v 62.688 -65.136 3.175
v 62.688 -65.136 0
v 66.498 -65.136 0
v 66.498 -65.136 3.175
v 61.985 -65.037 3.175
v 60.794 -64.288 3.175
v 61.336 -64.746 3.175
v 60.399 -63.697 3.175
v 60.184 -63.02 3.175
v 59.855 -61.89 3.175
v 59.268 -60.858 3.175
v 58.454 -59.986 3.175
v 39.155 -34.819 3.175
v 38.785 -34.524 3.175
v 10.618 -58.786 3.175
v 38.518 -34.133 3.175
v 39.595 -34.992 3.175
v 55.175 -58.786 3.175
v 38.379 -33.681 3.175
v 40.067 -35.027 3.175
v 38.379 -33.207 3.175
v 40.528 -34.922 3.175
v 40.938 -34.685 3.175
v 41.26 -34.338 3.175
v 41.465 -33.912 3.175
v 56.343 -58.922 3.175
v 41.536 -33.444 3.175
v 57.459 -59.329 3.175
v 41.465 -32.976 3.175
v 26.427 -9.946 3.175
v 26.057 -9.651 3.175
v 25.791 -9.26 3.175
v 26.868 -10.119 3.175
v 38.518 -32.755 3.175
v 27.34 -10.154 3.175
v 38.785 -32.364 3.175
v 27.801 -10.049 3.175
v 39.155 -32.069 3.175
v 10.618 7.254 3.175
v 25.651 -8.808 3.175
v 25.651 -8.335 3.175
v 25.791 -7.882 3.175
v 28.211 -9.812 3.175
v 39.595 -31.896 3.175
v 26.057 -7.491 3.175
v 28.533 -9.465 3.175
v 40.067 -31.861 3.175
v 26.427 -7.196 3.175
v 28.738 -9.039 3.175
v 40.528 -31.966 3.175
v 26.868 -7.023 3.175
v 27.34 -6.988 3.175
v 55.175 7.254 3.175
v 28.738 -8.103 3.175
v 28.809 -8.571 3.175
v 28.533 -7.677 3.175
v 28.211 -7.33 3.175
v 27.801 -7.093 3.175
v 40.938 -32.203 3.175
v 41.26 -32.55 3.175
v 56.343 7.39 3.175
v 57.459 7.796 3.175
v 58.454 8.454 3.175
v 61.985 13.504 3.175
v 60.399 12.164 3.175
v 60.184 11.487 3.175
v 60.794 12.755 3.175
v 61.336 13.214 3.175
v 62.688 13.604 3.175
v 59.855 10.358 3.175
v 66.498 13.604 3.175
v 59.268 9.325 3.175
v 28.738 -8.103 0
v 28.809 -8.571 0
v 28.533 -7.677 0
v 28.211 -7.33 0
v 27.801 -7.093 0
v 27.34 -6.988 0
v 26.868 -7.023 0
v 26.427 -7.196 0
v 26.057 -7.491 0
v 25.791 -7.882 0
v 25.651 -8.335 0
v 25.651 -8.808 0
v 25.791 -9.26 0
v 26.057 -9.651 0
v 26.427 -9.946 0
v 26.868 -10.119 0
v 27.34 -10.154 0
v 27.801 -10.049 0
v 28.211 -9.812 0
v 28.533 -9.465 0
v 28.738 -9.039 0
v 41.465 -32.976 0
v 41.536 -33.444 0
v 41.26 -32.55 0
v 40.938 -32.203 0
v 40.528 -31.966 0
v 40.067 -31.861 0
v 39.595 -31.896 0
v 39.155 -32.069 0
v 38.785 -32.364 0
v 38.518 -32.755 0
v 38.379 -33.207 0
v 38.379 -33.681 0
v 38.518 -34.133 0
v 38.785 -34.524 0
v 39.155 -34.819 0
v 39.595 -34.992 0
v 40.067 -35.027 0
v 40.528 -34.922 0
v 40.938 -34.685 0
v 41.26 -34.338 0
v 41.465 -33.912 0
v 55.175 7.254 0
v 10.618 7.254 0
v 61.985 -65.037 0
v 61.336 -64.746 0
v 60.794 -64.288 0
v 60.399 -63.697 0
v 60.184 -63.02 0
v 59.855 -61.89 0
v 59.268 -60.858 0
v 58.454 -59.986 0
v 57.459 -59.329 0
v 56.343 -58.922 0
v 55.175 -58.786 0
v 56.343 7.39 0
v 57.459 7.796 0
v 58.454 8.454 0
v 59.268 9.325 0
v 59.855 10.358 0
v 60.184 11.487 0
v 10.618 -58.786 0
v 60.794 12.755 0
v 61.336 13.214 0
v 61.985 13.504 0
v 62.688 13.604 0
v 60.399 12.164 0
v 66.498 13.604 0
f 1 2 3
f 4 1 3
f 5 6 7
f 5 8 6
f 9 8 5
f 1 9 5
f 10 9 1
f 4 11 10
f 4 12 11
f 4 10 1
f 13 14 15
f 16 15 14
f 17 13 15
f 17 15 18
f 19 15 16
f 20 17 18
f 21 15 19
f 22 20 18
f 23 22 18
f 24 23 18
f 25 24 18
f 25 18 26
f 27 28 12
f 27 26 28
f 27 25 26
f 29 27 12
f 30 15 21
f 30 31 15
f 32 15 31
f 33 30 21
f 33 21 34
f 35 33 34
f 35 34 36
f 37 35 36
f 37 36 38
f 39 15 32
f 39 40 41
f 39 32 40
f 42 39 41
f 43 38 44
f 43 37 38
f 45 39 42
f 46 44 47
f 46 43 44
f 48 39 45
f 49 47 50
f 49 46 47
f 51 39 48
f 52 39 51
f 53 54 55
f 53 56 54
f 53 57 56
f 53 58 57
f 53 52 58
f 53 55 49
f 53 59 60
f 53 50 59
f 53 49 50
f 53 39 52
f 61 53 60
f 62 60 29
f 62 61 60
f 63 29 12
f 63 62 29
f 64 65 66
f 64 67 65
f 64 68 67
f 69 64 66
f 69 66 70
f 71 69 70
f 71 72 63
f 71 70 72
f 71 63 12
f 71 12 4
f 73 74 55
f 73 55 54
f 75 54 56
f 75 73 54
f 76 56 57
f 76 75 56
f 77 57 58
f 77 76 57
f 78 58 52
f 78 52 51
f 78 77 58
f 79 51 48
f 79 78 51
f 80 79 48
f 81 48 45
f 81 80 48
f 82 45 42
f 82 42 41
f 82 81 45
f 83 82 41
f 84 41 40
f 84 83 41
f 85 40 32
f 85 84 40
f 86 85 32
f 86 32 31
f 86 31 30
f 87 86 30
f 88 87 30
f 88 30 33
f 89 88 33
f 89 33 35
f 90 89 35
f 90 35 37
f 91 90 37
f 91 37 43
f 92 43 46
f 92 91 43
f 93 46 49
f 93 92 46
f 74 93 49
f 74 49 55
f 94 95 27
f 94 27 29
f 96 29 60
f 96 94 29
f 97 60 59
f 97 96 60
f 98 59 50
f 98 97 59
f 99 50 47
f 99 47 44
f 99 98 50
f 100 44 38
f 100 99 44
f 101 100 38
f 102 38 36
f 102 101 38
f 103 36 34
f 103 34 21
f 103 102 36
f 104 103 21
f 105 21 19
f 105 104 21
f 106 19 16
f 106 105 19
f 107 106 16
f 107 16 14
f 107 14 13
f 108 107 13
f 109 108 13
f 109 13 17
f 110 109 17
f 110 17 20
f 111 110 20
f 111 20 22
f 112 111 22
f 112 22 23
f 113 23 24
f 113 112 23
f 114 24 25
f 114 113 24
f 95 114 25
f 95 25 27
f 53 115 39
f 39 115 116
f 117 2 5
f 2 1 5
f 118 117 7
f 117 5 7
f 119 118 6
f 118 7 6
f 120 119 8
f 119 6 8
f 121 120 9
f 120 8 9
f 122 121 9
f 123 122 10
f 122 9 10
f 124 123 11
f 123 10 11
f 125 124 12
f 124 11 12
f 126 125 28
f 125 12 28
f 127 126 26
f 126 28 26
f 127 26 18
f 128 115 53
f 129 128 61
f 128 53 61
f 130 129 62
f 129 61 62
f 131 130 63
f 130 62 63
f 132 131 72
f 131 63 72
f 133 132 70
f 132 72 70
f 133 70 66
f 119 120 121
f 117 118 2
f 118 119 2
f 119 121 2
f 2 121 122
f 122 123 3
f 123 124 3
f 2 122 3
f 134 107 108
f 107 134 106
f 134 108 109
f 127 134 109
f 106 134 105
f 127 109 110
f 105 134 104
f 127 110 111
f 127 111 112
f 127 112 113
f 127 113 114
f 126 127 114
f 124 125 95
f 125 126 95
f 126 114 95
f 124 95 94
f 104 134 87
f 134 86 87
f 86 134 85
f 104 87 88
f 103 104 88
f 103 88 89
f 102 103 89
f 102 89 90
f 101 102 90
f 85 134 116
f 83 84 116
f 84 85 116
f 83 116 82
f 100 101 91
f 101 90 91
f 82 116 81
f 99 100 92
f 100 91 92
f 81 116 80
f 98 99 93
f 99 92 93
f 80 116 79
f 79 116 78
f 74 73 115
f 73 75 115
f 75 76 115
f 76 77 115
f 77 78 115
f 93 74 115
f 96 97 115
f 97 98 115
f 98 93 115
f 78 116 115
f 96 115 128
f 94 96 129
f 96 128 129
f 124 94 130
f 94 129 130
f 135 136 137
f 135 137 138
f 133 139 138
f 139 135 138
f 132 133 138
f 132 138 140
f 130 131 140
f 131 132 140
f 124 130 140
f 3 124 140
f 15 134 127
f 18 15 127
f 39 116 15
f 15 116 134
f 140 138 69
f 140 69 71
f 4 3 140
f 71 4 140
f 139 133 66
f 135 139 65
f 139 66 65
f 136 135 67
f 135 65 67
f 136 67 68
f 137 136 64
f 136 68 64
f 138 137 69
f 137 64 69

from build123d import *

# Parameters (mm, degrees)
F0_W     = 6.35
F0_H     = 6.35
F1_DEPTH = 3.175
F0_R     = 1.5875
F2_DEPTH = 3.175
F3_R     = 2.54
F4_R     = 5.08


with BuildPart() as f1:
    # F0 (on Top) → F1 (new body)
    with BuildSketch(Plane.XY):
        Polygon((60.1484737206, 7.2537393374), (10.6184737206, 7.2537393374), (10.6184737206, -58.7862606626), (60.1484737206, -58.7862606626), (66.4984737206, -58.7862606626), (66.4984737206, 7.2537393374), align=None)
        with BuildLine():
            ThreePointArc((22.7113279829, -20.4435077931), (20.0093369897, 1.8826225402), (39.9210240364, -8.5711600259))
            ThreePointArc((39.9210240364, -8.5711600259), (39.8123227124, -10.2292304863), (39.4880795243, -11.8589175682))
            ThreePointArc((39.4880795243, -11.8589175682), (55.0511803081, -18.0157023959), (61.5383527356, -33.4440107709))
            ThreePointArc((61.5383527356, -33.4440107709), (33.0934006719, -53.9168643142), (22.7113279829, -20.4435077931))
        make_face(mode=Mode.SUBTRACT)
        with Locations((63.3234737206, 10.4287393374)):
            Rectangle(F0_W, F0_H)
        with Locations((63.3234737206, -61.9612606626)):
            Rectangle(F0_W, F0_H)
    extrude(amount=F1_DEPTH)

    # F0 (on Top) → F2 (join)
    with BuildSketch(Plane.XY):
        Polygon((60.1484737206, 7.2537393374), (10.6184737206, 7.2537393374), (10.6184737206, -58.7862606626), (60.1484737206, -58.7862606626), (66.4984737206, -58.7862606626), (66.4984737206, 7.2537393374), align=None)
        with BuildLine():
            ThreePointArc((22.7113279829, -20.4435077931), (20.0093369897, 1.8826225402), (39.9210240364, -8.5711600259))
            ThreePointArc((39.9210240364, -8.5711600259), (39.8123227124, -10.2292304863), (39.4880795243, -11.8589175682))
            ThreePointArc((39.4880795243, -11.8589175682), (55.0511803081, -18.0157023959), (61.5383527356, -33.4440107709))
            ThreePointArc((61.5383527356, -33.4440107709), (33.0934006719, -53.9168643142), (22.7113279829, -20.4435077931))
        make_face(mode=Mode.SUBTRACT)
        with BuildLine():
            ThreePointArc((39.4880795243, -11.8589175682), (39.8123227124, -10.2292304863), (39.9210240364, -8.5711600259))
            ThreePointArc((39.9210240364, -8.5711600259), (20.0093369897, 1.8826225402), (22.7113279829, -20.4435077931))
            ThreePointArc((22.7113279829, -20.4435077931), (26.0598460264, -16.9141141774), (30.1135988267, -14.2240806058))
            ThreePointArc((30.1135988267, -14.2240806058), (34.6667436153, -12.5100024328), (39.4880795243, -11.8589175682))
        make_face()
        with BuildLine():
            ThreePointArc((33.5710240364, -8.5711600259), (32.6381427317, -11.8843646741), (30.1135988267, -14.2240806058))
            ThreePointArc((30.1135988267, -14.2240806058), (21.8039053411, -5.2579553777), (33.5710240364, -8.5711600259))
        make_face(mode=Mode.SUBTRACT)
        with BuildLine():
            ThreePointArc((30.1135988267, -14.2240806058), (26.0598460264, -16.9141141774), (22.7113279829, -20.4435077931))
            ThreePointArc((22.7113279829, -20.4435077931), (33.0061734451, -19.8770012736), (39.4880795243, -11.8589175682))
            ThreePointArc((39.4880795243, -11.8589175682), (34.6667436153, -12.5100024328), (30.1135988267, -14.2240806058))
        make_face()
        with BuildLine():
            ThreePointArc((39.4880795243, -11.8589175682), (33.0061734451, -19.8770012736), (22.7113279829, -20.4435077931))
            ThreePointArc((22.7113279829, -20.4435077931), (33.0934006719, -53.9168643142), (61.5383527356, -33.4440107709))
            ThreePointArc((61.5383527356, -33.4440107709), (55.0511803081, -18.0157023959), (39.4880795243, -11.8589175682))
        make_face()
        with Locations((39.9483527356, -33.4440107709)):
            Circle(F0_R, mode=Mode.SUBTRACT)
        with BuildLine():
            ThreePointArc((33.5710240364, -8.5711600259), (21.8039053411, -5.2579553777), (30.1135988267, -14.2240806058))
            ThreePointArc((30.1135988267, -14.2240806058), (32.6381427317, -11.8843646741), (33.5710240364, -8.5711600259))
        make_face()
        with Locations((27.2210240364, -8.5711600259)):
            Circle(F0_R, mode=Mode.SUBTRACT)
    extrude(amount=F2_DEPTH)

    # F3
    f3_edges = [f1.edges().sort_by_distance(p)[0] for p in [
        (60.148474, -65.136261, 1.5875),
        (60.148474, 13.603739, 1.5875),
    ]]
    fillet(f3_edges, radius=F3_R)

    # F4
    f4_edges = [f1.edges().sort_by_distance(p)[0] for p in [
        (60.148474, -58.786261, 1.5875),
        (60.148474, 7.253739, 1.5875),
    ]]
    fillet(f4_edges, radius=F4_R)


solid = f1.part
